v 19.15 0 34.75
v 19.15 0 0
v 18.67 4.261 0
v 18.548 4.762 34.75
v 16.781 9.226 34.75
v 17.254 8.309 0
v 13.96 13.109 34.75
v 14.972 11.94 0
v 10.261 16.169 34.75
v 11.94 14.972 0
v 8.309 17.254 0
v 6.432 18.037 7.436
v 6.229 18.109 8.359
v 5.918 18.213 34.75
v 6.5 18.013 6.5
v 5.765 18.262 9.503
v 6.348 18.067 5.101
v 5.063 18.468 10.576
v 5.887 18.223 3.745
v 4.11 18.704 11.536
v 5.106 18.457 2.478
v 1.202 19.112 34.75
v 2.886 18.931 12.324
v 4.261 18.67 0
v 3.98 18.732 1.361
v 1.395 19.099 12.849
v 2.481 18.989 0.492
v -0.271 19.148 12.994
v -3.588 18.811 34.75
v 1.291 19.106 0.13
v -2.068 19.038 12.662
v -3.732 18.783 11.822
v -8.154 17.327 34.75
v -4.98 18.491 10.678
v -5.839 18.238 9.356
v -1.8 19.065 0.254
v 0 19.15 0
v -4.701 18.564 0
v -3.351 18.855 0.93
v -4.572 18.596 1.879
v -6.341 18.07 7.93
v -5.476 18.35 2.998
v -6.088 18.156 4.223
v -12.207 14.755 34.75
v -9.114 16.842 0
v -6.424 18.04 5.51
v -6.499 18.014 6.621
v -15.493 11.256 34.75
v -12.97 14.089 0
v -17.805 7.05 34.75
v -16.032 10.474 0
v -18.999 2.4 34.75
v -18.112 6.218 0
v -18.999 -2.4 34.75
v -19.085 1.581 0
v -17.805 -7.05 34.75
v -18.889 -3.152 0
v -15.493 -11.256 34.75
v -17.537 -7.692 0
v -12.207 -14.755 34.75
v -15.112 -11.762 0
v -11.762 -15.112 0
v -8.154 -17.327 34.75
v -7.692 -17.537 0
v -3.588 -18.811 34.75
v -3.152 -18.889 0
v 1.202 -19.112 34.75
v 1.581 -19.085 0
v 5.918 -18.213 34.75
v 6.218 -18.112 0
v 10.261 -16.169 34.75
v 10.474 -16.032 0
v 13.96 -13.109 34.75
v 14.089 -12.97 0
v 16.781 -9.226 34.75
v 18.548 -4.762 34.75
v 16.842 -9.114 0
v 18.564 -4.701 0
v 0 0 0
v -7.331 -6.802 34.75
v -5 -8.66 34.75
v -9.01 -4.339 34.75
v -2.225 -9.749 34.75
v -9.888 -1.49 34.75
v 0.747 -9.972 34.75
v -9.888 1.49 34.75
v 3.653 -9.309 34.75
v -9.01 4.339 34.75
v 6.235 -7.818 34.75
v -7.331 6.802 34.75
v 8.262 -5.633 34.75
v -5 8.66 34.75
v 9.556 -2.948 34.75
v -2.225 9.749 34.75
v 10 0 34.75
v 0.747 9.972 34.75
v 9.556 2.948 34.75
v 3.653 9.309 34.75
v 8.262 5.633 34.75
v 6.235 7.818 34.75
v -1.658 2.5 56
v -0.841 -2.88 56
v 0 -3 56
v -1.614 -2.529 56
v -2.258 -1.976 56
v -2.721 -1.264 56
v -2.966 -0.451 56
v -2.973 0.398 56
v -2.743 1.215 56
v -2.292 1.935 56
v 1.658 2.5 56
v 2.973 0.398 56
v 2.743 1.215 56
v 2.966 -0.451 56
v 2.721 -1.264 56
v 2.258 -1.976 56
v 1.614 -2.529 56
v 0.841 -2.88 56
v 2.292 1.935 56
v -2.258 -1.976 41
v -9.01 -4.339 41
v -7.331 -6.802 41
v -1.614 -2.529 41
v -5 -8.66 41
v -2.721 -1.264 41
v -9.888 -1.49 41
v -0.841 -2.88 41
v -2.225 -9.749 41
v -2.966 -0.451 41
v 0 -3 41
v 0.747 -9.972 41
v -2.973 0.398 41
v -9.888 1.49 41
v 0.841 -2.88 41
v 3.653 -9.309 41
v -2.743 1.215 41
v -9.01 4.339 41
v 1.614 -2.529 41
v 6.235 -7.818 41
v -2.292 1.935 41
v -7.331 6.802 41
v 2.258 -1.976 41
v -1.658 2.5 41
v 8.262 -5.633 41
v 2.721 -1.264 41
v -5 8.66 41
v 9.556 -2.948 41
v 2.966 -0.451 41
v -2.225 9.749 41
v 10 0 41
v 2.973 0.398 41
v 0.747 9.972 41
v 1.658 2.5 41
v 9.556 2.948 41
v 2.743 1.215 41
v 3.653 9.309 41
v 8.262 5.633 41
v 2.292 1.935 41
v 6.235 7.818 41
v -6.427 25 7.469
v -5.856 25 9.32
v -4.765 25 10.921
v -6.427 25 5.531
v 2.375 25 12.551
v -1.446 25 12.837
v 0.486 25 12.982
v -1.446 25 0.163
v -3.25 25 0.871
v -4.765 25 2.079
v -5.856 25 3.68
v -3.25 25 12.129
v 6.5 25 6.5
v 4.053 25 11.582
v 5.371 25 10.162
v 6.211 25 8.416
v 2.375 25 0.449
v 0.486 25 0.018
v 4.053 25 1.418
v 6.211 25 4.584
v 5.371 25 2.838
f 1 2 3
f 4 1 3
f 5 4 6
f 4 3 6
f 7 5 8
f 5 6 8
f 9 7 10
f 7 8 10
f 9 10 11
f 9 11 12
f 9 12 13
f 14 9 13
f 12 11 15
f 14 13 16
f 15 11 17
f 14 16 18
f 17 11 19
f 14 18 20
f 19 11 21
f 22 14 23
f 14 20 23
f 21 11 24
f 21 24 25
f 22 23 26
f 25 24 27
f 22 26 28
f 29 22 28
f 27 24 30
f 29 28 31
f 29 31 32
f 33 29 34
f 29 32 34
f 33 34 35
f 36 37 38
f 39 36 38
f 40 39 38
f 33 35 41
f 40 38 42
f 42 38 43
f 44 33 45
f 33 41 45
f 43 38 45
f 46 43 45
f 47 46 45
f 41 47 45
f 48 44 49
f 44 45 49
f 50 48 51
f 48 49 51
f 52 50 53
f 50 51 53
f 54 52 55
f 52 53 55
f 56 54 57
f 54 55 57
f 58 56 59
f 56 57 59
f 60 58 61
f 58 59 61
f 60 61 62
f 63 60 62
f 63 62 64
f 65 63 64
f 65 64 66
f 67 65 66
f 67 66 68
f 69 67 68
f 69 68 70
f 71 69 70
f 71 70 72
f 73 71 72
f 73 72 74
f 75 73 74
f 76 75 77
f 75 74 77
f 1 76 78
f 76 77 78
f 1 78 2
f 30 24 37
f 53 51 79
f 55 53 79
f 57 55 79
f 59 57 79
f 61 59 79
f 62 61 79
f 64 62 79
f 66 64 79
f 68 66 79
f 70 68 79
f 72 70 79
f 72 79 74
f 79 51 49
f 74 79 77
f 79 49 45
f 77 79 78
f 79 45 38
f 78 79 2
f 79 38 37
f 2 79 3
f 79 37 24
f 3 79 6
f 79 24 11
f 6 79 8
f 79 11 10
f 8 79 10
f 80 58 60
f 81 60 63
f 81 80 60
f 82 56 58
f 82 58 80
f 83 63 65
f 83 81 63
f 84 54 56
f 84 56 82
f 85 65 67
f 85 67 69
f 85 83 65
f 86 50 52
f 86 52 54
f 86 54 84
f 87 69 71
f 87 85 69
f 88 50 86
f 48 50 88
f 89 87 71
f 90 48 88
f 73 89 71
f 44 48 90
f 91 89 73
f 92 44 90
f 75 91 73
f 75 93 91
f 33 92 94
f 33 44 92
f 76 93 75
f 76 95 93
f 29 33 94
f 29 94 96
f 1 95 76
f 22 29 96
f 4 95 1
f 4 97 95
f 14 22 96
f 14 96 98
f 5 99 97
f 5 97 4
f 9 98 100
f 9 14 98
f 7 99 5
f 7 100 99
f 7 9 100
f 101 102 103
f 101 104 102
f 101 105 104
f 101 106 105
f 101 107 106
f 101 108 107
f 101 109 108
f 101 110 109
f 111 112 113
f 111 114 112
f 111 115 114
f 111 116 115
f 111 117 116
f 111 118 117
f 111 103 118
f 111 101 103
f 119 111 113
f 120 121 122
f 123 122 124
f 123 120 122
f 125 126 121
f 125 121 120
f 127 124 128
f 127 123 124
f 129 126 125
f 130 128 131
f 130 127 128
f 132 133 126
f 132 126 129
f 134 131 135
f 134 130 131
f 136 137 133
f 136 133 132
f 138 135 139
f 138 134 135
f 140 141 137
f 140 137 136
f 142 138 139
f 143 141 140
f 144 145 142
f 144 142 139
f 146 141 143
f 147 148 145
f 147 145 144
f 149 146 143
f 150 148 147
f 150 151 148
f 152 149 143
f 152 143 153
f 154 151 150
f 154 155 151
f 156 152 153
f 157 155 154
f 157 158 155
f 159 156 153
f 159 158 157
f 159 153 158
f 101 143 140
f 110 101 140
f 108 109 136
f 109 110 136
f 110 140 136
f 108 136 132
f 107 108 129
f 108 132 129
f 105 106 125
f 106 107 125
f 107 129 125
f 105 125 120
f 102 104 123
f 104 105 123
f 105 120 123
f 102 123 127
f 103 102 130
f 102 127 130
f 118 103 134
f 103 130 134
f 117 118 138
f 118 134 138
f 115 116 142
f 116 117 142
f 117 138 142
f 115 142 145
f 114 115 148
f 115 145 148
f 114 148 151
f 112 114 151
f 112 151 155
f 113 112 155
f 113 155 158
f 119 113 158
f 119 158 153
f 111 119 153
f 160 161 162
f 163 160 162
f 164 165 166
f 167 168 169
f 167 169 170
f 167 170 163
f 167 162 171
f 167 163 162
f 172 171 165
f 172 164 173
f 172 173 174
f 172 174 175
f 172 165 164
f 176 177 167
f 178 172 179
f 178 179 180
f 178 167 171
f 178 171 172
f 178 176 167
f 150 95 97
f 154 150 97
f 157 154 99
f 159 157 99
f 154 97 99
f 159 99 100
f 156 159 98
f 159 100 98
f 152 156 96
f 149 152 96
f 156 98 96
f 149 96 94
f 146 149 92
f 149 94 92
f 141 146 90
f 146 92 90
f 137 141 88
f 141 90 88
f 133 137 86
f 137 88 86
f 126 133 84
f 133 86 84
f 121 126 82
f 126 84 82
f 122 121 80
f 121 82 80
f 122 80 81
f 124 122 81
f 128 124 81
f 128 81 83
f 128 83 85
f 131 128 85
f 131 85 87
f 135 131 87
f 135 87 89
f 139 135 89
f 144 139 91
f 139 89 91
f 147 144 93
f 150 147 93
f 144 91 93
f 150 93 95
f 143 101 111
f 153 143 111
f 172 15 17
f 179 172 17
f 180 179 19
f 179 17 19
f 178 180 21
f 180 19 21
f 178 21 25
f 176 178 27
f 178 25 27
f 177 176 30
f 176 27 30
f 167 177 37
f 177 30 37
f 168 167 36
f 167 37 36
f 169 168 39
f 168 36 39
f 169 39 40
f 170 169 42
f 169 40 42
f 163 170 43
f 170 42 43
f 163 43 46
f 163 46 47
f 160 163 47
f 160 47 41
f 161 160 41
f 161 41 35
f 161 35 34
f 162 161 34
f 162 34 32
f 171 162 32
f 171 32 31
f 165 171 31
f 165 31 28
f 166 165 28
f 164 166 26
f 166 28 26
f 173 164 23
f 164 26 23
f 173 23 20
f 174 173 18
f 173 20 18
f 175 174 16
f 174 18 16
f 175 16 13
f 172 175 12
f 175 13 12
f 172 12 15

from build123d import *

# Parameters (mm, degrees)
SKETCH1_R           = 19.15
BOSS_EXTRUDE1_DEPTH = 34.75
SKETCH2_R           = 10
BOSS_EXTRUDE2_DEPTH = 6.25
SKETCH3_R           = 3
BOSS_EXTRUDE3_DEPTH = 15
CUT_EXTRUDE1_DEPTH  = 15
SKETCH5_R           = 6.5
BOSS_EXTRUDE4_DEPTH = 25


with BuildPart() as part:
    # Sketch1 → Boss-Extrude1 (new body)
    with BuildSketch(Plane.XY):
        Circle(SKETCH1_R)
    extrude(amount=BOSS_EXTRUDE1_DEPTH)

    # Sketch2 → Boss-Extrude2 (add)
    with BuildSketch(Plane.XY.offset(34.75)):
        Circle(SKETCH2_R)
    extrude(amount=BOSS_EXTRUDE2_DEPTH)

    # Sketch3 → Boss-Extrude3 (add)
    with BuildSketch(Plane.XY.offset(41)):
        Circle(SKETCH3_R)
    extrude(amount=BOSS_EXTRUDE3_DEPTH)

    # Sketch4 → Cut-Extrude1 (cut)
    with BuildSketch(Plane.XY.offset(56)):
        with BuildLine():
            Line((-1.658312395, 2.5), (1.658312395, 2.5))
            ThreePointArc((1.658312395, 2.5), (0, 3), (-1.658312395, 2.5))
        make_face()
    extrude(amount=-CUT_EXTRUDE1_DEPTH, mode=Mode.SUBTRACT)

    # Sketch5 → Boss-Extrude4 (add)
    with BuildSketch(Plane(origin=(0, 0, 0), x_dir=(1, 0, 0), z_dir=(0, 1, 0))):
        with Locations((0, -6.5)):
            Circle(SKETCH5_R)
    extrude(amount=BOSS_EXTRUDE4_DEPTH)


solid = part.part
